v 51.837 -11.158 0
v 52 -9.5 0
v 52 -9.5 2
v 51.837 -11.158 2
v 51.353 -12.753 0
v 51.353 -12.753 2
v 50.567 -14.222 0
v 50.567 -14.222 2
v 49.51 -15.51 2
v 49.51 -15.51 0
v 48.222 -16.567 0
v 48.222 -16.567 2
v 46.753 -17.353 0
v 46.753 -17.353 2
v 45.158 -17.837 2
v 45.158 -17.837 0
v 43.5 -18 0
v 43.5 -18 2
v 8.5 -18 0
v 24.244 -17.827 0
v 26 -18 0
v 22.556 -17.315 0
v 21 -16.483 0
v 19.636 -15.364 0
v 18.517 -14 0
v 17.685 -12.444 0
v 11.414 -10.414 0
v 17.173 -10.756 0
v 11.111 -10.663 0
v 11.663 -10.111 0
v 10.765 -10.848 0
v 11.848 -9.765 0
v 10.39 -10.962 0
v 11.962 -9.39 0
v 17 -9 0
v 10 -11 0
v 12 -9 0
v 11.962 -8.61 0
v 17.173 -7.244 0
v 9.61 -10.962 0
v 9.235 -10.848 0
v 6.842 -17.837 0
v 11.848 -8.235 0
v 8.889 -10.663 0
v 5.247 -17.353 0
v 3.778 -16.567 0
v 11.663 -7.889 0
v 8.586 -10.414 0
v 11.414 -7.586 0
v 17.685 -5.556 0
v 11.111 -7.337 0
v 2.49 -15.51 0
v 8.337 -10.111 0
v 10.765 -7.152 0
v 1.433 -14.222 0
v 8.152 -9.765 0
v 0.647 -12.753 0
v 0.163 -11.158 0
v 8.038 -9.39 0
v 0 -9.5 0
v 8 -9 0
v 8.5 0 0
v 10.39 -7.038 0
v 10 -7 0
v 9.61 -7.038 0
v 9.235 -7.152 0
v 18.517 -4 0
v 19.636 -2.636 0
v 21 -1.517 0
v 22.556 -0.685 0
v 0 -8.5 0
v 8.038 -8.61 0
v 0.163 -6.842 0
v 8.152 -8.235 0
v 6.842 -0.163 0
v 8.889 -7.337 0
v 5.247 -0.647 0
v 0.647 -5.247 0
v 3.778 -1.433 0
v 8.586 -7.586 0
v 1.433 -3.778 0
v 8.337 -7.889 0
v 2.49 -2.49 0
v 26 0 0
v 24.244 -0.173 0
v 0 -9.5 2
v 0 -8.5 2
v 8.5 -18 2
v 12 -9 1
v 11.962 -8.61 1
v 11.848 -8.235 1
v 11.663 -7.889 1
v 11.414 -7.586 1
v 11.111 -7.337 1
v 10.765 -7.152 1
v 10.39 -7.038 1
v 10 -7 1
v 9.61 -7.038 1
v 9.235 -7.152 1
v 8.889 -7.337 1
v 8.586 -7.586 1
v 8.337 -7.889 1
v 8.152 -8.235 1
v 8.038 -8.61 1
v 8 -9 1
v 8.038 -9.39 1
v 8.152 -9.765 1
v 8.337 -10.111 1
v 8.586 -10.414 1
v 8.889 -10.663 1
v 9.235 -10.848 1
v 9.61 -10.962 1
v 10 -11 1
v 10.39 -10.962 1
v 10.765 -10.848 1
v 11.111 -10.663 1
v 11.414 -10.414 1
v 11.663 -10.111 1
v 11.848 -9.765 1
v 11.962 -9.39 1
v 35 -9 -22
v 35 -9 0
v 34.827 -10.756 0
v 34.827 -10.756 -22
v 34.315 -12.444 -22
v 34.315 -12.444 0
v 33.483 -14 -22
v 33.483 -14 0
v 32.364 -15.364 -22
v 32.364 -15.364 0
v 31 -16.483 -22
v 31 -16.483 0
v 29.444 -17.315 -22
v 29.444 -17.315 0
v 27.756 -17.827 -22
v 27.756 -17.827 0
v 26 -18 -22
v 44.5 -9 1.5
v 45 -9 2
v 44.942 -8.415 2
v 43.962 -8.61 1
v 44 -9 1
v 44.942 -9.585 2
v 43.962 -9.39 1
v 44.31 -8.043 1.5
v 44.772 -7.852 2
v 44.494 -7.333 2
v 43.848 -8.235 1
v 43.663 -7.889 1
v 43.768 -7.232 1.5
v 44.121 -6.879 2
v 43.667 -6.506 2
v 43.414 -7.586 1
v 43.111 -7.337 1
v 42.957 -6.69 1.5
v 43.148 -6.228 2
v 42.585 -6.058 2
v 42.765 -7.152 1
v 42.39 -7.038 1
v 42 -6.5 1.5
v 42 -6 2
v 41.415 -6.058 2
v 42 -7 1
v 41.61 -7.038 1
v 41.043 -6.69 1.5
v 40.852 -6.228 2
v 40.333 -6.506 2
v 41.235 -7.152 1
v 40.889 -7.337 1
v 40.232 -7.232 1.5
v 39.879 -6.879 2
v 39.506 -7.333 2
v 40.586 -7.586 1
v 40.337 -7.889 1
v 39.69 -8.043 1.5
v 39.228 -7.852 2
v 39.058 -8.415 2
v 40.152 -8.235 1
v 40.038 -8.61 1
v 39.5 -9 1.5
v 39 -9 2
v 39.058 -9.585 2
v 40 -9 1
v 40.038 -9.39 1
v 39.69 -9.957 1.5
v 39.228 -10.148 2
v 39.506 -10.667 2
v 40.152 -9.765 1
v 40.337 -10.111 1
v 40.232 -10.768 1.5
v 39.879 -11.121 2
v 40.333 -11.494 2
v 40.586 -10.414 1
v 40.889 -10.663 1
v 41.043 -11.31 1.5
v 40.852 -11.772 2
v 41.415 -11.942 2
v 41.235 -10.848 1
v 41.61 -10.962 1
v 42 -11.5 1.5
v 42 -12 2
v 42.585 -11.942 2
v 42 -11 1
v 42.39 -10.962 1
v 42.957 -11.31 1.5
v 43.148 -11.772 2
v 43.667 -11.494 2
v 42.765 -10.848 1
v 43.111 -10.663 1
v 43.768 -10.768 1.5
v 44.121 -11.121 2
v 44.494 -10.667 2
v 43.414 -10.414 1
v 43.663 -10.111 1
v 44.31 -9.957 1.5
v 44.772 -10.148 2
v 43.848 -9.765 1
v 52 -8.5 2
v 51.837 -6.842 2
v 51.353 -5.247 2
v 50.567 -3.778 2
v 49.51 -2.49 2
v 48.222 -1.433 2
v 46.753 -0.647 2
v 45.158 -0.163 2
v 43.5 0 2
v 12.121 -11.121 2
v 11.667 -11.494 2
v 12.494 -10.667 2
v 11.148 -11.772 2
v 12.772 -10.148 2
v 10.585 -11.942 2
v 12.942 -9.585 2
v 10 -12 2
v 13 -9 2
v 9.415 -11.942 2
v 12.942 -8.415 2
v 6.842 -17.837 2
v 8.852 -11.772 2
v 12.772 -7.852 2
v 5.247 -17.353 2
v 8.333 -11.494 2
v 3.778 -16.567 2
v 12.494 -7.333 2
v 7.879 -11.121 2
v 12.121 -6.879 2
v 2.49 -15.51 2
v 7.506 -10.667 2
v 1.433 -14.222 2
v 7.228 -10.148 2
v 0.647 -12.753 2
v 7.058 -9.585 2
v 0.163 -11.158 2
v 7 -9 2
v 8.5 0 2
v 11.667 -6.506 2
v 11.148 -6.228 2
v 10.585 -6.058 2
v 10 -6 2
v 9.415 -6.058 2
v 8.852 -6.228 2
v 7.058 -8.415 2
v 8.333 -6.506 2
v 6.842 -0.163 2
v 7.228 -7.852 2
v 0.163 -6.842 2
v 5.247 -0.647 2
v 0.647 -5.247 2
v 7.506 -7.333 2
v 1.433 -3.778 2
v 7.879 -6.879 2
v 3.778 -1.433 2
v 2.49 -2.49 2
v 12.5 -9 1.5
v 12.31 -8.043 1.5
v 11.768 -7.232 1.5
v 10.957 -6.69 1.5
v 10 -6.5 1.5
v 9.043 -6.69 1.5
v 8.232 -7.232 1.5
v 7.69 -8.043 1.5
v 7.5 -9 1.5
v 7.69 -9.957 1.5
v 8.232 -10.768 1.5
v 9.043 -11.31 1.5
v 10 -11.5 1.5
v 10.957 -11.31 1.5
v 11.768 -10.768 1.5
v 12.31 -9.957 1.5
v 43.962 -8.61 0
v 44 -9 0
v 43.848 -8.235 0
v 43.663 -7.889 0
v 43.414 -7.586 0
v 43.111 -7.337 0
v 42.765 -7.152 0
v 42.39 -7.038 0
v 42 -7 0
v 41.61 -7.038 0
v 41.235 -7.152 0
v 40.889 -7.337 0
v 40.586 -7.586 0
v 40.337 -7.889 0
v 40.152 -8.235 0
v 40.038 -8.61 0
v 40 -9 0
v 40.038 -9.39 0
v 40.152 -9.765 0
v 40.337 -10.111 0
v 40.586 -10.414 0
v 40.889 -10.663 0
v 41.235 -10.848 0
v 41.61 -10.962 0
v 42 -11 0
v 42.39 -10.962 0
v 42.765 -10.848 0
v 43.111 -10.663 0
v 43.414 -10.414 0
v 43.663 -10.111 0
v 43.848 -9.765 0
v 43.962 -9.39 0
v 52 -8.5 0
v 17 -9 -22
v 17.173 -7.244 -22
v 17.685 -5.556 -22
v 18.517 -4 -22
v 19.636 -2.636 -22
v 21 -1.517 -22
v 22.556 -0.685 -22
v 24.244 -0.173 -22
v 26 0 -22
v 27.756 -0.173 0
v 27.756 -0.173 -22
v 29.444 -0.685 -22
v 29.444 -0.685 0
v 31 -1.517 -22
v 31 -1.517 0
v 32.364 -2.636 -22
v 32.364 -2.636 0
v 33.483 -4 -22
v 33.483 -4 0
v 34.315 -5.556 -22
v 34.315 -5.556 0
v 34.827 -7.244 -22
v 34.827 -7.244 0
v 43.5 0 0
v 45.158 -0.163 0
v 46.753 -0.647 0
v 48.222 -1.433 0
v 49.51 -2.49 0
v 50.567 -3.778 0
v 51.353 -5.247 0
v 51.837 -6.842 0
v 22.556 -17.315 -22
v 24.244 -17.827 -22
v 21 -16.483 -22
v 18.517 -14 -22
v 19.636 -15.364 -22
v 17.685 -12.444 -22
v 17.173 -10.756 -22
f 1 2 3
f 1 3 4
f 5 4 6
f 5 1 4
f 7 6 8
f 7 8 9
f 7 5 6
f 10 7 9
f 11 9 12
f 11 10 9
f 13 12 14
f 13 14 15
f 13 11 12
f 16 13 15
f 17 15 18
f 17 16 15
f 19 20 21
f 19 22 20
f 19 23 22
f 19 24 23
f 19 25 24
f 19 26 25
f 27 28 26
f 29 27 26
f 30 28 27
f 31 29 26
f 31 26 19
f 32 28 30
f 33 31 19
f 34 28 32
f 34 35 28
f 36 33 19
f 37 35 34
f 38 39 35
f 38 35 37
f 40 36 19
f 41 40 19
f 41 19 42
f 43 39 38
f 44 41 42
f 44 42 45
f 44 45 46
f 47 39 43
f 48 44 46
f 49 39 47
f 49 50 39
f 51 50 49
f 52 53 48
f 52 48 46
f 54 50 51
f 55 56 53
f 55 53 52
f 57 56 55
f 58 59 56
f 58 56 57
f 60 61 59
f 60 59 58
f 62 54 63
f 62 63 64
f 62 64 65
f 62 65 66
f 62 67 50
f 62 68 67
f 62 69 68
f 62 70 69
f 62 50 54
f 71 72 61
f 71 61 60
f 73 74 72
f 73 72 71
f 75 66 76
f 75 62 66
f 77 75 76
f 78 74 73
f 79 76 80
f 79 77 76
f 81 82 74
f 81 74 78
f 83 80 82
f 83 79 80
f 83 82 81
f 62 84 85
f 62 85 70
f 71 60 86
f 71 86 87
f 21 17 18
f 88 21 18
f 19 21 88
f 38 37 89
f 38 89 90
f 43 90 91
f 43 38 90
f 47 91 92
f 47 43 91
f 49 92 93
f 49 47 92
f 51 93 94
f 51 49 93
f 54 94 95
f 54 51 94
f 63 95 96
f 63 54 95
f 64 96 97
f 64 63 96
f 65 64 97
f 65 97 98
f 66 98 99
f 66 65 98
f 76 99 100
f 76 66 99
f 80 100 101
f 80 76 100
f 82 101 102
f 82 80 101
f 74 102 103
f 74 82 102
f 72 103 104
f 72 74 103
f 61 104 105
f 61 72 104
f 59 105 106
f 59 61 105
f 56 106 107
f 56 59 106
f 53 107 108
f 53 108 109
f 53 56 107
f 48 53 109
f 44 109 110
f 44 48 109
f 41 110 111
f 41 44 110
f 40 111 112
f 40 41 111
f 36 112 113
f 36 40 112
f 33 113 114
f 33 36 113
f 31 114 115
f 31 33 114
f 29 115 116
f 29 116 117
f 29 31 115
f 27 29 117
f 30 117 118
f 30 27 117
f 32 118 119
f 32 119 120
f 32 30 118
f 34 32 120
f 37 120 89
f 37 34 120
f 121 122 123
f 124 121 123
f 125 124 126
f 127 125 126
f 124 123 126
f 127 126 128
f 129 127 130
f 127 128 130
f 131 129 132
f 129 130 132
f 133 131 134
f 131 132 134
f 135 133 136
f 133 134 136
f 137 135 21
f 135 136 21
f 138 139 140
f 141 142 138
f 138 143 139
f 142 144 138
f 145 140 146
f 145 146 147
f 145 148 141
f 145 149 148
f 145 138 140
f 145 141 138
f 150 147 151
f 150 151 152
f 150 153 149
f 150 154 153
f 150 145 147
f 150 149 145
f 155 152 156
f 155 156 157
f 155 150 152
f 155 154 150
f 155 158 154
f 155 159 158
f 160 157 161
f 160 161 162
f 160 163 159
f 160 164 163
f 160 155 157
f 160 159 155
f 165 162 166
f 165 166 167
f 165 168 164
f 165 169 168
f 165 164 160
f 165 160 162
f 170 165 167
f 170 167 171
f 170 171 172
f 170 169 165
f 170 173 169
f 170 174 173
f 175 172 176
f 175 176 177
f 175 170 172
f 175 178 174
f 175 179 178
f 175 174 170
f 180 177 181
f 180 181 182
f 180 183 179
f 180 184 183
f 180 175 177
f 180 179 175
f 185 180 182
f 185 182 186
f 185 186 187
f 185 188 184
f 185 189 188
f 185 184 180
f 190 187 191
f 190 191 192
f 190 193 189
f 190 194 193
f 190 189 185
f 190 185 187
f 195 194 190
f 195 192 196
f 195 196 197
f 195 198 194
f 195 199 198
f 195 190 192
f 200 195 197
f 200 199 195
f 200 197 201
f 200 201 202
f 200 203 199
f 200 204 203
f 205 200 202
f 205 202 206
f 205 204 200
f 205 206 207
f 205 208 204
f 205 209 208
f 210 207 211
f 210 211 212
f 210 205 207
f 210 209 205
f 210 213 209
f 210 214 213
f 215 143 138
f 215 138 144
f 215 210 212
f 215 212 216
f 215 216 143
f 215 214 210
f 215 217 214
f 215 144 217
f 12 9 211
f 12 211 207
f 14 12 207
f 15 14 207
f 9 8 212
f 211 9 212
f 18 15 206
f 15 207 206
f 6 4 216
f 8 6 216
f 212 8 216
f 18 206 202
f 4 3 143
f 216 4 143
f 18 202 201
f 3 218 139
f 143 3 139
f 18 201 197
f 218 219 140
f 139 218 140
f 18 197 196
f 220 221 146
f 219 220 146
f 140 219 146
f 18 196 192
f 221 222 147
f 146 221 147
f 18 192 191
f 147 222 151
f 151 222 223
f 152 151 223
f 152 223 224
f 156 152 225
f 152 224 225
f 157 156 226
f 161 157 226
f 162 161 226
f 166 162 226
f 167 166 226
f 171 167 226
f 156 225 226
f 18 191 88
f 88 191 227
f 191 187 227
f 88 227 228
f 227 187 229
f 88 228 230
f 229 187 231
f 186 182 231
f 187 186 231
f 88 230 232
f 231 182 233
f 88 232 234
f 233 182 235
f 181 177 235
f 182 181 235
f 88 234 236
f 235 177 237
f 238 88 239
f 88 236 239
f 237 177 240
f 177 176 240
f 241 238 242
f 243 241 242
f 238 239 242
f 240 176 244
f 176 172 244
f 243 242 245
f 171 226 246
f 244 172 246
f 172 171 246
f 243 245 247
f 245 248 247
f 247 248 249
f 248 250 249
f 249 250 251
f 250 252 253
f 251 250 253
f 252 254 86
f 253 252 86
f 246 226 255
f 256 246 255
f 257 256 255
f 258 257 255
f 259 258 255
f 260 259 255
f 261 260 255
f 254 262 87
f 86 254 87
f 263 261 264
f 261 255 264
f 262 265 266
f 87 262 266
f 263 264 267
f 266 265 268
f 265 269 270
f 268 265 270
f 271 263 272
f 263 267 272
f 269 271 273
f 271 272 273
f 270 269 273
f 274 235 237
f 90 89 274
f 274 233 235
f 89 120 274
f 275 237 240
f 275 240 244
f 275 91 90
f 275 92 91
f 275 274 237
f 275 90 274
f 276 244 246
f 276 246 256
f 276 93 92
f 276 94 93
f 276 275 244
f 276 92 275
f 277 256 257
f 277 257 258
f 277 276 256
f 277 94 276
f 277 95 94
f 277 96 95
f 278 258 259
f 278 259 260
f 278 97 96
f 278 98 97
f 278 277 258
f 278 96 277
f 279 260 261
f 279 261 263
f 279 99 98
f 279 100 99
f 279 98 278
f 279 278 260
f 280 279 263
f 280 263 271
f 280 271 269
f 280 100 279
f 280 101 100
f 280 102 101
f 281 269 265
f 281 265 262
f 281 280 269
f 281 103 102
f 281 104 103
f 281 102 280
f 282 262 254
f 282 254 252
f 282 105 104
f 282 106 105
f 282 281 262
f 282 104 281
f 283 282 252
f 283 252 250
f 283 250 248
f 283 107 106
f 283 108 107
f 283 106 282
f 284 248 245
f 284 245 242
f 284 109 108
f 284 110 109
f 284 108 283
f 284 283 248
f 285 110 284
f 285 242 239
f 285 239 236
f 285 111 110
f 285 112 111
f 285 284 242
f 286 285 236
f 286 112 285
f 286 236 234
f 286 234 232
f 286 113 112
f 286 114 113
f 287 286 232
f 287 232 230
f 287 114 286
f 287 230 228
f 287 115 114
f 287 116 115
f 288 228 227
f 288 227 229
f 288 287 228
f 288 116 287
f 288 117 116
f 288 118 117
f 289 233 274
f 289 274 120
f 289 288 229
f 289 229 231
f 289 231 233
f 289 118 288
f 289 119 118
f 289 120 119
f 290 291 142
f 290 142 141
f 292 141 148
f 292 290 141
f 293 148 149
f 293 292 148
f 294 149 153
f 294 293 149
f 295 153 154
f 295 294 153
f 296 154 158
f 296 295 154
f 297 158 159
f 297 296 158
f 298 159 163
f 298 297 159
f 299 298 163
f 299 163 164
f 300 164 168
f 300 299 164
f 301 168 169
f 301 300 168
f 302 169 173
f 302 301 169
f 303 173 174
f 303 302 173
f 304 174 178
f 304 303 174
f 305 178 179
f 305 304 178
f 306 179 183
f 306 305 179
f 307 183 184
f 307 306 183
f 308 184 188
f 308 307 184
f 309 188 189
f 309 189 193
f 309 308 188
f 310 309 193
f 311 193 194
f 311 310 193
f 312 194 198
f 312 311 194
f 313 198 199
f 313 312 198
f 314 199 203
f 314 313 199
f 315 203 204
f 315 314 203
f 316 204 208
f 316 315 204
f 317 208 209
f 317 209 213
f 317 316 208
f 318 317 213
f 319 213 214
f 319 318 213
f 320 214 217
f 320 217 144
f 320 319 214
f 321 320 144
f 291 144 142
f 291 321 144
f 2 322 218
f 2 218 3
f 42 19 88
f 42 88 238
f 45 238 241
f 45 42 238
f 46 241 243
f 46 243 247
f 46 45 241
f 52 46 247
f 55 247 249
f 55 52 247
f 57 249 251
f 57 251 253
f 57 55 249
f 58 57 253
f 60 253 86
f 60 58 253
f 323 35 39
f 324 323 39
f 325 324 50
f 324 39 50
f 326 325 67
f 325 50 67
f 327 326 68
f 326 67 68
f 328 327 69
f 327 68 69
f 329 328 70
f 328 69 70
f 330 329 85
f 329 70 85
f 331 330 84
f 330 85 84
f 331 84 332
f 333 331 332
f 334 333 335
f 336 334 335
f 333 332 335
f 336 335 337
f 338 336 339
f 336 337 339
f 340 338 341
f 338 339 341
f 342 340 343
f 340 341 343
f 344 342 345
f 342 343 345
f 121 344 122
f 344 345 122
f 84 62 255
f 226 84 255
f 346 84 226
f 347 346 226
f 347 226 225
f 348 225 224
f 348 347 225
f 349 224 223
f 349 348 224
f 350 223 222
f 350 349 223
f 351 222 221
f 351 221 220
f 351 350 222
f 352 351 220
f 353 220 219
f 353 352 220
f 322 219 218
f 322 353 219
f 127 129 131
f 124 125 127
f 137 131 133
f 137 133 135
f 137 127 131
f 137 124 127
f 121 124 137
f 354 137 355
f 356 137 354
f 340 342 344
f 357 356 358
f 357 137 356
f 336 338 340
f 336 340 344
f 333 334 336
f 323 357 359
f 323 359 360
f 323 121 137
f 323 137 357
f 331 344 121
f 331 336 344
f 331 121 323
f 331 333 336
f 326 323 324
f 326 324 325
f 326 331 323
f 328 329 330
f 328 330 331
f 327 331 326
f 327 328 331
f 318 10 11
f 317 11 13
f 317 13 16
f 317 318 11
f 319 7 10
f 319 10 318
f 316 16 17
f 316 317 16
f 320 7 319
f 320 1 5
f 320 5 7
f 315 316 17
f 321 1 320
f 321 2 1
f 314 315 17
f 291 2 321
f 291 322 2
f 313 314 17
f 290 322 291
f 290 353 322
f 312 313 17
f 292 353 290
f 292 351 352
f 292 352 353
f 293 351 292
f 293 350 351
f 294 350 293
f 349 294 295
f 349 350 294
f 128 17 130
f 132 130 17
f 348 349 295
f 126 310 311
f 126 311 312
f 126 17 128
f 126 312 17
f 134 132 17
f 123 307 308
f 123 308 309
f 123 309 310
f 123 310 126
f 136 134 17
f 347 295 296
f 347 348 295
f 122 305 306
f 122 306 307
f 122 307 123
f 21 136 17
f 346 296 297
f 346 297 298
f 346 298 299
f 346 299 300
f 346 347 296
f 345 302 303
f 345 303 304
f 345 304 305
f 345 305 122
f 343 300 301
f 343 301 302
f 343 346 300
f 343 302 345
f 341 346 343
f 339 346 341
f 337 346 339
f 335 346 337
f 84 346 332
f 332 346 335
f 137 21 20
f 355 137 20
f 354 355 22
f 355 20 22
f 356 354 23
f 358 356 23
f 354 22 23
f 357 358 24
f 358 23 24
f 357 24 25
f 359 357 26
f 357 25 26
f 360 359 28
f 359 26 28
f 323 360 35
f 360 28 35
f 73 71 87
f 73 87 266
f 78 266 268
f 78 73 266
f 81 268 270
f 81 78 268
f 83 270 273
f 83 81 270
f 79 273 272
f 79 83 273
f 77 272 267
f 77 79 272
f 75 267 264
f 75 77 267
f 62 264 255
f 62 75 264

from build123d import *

# Parameters (mm, degrees)
ESQUISSE1_R        = 2
BOSS_EXTRU_1_DEPTH = 2
BOSS_EXTRU_2_DEPTH = 22
CHANFREIN1_SIZE    = 1


with BuildPart() as part:
    # Esquisse1 → Boss.-Extru.1 (new body)
    with BuildSketch(Plane.XY):
        with BuildLine():
            Line((8.5, 0), (43.5, 0))
            ThreePointArc((43.5, 0), (49.51040764, -2.48959236), (52, -8.5))
            Line((52, -8.5), (52, -9.5))
            ThreePointArc((52, -9.5), (49.51040764, -15.51040764), (43.5, -18))
            Line((43.5, -18), (8.5, -18))
            ThreePointArc((8.5, -18), (2.48959236, -15.51040764), (0, -9.5))
            Line((0, -9.5), (0, -8.5))
            ThreePointArc((0, -8.5), (2.48959236, -2.48959236), (8.5, 0))
        make_face()
        with Locations((10, -9)):
            Circle(ESQUISSE1_R, mode=Mode.SUBTRACT)
        with Locations((42, -9)):
            Circle(ESQUISSE1_R, mode=Mode.SUBTRACT)
    extrude(amount=BOSS_EXTRU_1_DEPTH)

    # Esquisse2 → Boss.-Extru.2 (add)
    with BuildSketch(Plane(origin=(0, 0, 0), x_dir=(-1, 0, 0), z_dir=(0, 0, -1))):
        with BuildLine():
            ThreePointArc((-35, -9), (-32.363961031, -15.363961031), (-26, -18))
            Line((-26, -18), (-26, -9))
            Line((-26, -9), (-35, -9))
        make_face()
        with BuildLine():
            Line((-26, -9), (-26, -18))
            ThreePointArc((-26, -18), (-19.636038969, -15.363961031), (-17, -9))
            Line((-17, -9), (-26, -9))
        make_face()
        with BuildLine():
            Line((-35, -9), (-26, -9))
            Line((-26, -9), (-26, 0))
            ThreePointArc((-26, 0), (-32.363961031, -2.636038969), (-35, -9))
        make_face()
        with BuildLine():
            Line((-26, 0), (-26, -9))
            Line((-26, -9), (-17, -9))
            ThreePointArc((-17, -9), (-19.636038969, -2.636038969), (-26, 0))
        make_face()
    extrude(amount=BOSS_EXTRU_2_DEPTH)

    # Chanfrein1
    chanfrein1_edges = [part.edges().sort_by_distance(p)[0] for p in [
        (8, -9, 2),
        (40, -9, 2),
    ]]
    chamfer(chanfrein1_edges, length=CHANFREIN1_SIZE)


solid = part.part
